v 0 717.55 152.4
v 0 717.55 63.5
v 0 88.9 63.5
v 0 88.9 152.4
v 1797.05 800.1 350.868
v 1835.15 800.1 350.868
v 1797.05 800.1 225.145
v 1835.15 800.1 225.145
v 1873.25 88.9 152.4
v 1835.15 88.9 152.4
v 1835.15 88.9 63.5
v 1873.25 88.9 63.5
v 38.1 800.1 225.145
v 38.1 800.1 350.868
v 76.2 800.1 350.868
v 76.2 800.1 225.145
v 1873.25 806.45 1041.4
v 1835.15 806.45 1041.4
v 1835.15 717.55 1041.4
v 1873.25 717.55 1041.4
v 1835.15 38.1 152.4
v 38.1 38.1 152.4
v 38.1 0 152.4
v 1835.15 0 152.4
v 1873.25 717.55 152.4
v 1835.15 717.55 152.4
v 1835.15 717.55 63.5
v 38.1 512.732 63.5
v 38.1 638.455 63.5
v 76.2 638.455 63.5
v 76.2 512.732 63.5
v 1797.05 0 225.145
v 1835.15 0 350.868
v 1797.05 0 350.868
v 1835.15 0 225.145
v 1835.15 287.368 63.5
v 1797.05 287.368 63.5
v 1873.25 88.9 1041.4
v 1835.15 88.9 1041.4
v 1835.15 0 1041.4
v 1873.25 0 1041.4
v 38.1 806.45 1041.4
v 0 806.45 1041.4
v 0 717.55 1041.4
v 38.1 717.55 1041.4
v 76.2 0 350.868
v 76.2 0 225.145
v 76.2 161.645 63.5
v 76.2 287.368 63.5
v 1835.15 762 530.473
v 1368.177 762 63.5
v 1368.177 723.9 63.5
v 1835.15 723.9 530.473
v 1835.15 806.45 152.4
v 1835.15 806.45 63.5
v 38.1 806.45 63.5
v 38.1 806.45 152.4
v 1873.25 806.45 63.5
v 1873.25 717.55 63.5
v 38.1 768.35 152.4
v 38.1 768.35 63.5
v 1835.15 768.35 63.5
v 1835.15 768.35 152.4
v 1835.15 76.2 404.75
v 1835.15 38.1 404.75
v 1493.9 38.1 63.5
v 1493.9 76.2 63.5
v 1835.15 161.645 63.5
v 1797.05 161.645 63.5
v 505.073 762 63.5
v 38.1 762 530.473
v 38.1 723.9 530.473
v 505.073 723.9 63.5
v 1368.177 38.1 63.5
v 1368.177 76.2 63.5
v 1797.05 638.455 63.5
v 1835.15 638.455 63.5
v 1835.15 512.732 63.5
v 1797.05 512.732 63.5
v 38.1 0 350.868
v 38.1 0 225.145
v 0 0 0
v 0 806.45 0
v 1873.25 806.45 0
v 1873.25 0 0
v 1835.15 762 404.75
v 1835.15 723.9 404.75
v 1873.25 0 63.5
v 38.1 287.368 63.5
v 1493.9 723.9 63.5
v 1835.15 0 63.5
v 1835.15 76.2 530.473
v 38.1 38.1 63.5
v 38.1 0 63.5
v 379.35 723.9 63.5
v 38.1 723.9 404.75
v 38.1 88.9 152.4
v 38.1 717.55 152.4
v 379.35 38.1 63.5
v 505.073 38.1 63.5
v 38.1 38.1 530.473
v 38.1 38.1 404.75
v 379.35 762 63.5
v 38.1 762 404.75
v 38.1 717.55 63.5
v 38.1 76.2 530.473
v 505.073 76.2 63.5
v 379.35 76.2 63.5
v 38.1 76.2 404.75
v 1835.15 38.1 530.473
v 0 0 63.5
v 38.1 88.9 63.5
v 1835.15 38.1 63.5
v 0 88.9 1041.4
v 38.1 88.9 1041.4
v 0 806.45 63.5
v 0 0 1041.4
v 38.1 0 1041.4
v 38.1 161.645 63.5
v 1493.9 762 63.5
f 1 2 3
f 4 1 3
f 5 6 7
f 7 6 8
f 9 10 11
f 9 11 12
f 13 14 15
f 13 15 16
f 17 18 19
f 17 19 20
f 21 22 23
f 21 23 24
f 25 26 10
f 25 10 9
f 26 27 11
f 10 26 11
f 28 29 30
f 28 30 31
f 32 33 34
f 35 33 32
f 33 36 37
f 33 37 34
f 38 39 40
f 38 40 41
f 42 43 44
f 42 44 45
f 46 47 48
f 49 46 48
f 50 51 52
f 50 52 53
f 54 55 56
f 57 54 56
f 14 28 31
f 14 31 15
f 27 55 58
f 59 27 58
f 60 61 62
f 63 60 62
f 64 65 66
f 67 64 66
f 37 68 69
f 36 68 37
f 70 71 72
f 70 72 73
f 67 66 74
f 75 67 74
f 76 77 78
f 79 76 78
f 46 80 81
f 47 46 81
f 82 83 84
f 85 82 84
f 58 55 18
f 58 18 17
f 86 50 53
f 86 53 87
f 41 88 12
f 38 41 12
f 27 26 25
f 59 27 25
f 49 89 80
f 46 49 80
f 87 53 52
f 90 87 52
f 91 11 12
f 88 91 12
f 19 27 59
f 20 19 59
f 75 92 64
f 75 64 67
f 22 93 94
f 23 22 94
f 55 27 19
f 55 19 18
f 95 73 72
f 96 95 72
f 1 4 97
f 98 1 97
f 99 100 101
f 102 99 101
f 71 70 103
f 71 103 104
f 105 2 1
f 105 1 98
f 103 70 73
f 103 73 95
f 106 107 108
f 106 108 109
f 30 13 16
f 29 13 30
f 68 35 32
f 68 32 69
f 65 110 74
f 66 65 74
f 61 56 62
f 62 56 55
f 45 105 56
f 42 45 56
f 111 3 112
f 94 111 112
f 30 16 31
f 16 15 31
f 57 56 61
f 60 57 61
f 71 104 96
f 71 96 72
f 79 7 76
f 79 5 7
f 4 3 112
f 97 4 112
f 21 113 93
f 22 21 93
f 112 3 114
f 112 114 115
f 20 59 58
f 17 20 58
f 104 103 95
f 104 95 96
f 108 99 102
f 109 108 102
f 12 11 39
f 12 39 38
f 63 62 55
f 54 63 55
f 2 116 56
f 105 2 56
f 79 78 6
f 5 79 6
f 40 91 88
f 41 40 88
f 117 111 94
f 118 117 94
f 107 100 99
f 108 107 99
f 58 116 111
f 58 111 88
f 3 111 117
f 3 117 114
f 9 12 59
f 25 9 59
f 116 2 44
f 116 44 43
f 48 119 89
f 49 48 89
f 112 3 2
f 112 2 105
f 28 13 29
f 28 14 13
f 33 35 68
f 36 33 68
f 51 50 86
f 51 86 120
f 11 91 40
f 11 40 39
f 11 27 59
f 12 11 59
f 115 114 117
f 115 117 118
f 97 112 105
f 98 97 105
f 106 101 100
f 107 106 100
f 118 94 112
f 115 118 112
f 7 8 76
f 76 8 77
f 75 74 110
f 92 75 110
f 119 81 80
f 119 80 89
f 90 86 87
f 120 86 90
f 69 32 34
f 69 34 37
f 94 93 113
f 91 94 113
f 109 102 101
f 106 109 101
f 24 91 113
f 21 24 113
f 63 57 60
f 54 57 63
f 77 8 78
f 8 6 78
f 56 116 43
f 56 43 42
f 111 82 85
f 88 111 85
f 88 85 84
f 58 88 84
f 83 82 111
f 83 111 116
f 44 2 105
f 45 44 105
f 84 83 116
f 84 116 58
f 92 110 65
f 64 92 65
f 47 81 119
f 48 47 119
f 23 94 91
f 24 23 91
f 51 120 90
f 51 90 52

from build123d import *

# Parameters (mm, degrees)
F0_W      = 1873.25
F0_H      = 806.45
F1_DEPTH  = 63.5
F2_W      = 38.1
F2_H      = 88.9
F3_DEPTH  = 977.9
F4_W      = 38.1
F4_H      = 314.325
F5_DEPTH  = 88.9
F7_DEPTH  = 38.1
F12_DEPTH = 38.1


with BuildPart() as f1:
    # F0 (on Top) → F1 (new body)
    with BuildSketch(Plane.XY):
        with Locations((936.625, 403.225)):
            Rectangle(F0_W, F0_H)
    extrude(amount=F1_DEPTH)


with BuildPart() as f3:
    # F2 (on face) → F3 (new body)
    with BuildSketch(Plane.XY.offset(63.5)):
        with Locations((19.05, 762)):
            Rectangle(F2_W, F2_H)
        with Locations((19.05, 44.45)):
            Rectangle(F2_W, F2_H)
        with Locations((1854.2, 44.45)):
            Rectangle(F2_W, F2_H)
        with Locations((1854.2, 762)):
            Rectangle(F2_W, F2_H)
    extrude(amount=F3_DEPTH)


with BuildPart() as f5:
    # F4 (on face) → F5 (new body)
    with BuildSketch(Plane.XY.offset(63.5)):
        with Locations((19.05, 560.3875)):
            Rectangle(F4_W, F4_H)
        with Locations((19.05, 246.0625)):
            Rectangle(F4_W, F4_H)
        Polygon((38.1, 38.1), (38.1, 0), (1835.15, 0), (1835.15, 38.1), (936.625, 38.1), align=None)
        Polygon((38.1, 768.35), (936.625, 768.35), (1835.15, 768.35), (1835.15, 806.45), (38.1, 806.45), align=None)
        with Locations((1854.2, 560.3875)):
            Rectangle(F4_W, F4_H)
        with Locations((1854.2, 246.0625)):
            Rectangle(F4_W, F4_H)
    extrude(amount=F5_DEPTH)


with BuildPart() as f7:
    # F6 (on face) → F7 (new body)
    with BuildSketch(Plane(origin=(0, 38.1, 0), x_dir=(-1, 0, 0), z_dir=(0, 1, 0))):
        Polygon((-38.1, 530.473318), (-416.173318, 152.4), (-290.449733, 152.4), (-38.1, 404.749733), align=None)
        Polygon((-416.173318, 152.4), (-505.073318, 63.5), (-379.349733, 63.5), (-290.449733, 152.4), align=None)
        Polygon((-1582.800267, 152.4), (-1457.076682, 152.4), (-1835.15, 530.473318), (-1835.15, 404.749733), align=None)
        Polygon((-1493.900267, 63.5), (-1368.176682, 63.5), (-1457.076682, 152.4), (-1582.800267, 152.4), align=None)
    extrude(amount=F7_DEPTH)


with BuildPart() as f9_1:
    # F9: instance of F7
    add(f7.part.mirror(Plane(origin=(936.625, 400.05, 31.75), x_dir=(1, 0, 0), z_dir=(0, -1, 0))))


with BuildPart() as f12:
    # F11 (on face) → F12 (new body)
    with BuildSketch(Plane.YZ.offset(38.1)):
        Polygon((0, 225.14461), (88.9, 136.24461), (88.9, 152.4), (198.468196, 152.4), (0, 350.868196), align=None)
        Polygon((88.9, 136.24461), (161.64461, 63.5), (287.368196, 63.5), (198.468196, 152.4), (88.9, 152.4), align=None)
    extrude(amount=F12_DEPTH)


with BuildPart() as f13_1:
    # F13: instance of F12
    add(f12.part.mirror(Plane(origin=(936.625, 400.05, 31.75), x_dir=(1, 0, 0), z_dir=(0, -1, 0))))


with BuildPart() as f14_1:
    # F14: instance of F12
    add(f12.part.mirror(Plane(origin=(936.625, 403.225, 107.95), x_dir=(0, -1, 0), z_dir=(-1, 0, 0))))


with BuildPart() as f14_2:
    # F14: instance of F13_1
    add(f13_1.part.mirror(Plane(origin=(936.625, 403.225, 107.95), x_dir=(0, -1, 0), z_dir=(-1, 0, 0))))


solid = Compound([f1.part, f3.part, f5.part, f7.part, f9_1.part, f12.part, f13_1.part, f14_1.part, f14_2.part])
